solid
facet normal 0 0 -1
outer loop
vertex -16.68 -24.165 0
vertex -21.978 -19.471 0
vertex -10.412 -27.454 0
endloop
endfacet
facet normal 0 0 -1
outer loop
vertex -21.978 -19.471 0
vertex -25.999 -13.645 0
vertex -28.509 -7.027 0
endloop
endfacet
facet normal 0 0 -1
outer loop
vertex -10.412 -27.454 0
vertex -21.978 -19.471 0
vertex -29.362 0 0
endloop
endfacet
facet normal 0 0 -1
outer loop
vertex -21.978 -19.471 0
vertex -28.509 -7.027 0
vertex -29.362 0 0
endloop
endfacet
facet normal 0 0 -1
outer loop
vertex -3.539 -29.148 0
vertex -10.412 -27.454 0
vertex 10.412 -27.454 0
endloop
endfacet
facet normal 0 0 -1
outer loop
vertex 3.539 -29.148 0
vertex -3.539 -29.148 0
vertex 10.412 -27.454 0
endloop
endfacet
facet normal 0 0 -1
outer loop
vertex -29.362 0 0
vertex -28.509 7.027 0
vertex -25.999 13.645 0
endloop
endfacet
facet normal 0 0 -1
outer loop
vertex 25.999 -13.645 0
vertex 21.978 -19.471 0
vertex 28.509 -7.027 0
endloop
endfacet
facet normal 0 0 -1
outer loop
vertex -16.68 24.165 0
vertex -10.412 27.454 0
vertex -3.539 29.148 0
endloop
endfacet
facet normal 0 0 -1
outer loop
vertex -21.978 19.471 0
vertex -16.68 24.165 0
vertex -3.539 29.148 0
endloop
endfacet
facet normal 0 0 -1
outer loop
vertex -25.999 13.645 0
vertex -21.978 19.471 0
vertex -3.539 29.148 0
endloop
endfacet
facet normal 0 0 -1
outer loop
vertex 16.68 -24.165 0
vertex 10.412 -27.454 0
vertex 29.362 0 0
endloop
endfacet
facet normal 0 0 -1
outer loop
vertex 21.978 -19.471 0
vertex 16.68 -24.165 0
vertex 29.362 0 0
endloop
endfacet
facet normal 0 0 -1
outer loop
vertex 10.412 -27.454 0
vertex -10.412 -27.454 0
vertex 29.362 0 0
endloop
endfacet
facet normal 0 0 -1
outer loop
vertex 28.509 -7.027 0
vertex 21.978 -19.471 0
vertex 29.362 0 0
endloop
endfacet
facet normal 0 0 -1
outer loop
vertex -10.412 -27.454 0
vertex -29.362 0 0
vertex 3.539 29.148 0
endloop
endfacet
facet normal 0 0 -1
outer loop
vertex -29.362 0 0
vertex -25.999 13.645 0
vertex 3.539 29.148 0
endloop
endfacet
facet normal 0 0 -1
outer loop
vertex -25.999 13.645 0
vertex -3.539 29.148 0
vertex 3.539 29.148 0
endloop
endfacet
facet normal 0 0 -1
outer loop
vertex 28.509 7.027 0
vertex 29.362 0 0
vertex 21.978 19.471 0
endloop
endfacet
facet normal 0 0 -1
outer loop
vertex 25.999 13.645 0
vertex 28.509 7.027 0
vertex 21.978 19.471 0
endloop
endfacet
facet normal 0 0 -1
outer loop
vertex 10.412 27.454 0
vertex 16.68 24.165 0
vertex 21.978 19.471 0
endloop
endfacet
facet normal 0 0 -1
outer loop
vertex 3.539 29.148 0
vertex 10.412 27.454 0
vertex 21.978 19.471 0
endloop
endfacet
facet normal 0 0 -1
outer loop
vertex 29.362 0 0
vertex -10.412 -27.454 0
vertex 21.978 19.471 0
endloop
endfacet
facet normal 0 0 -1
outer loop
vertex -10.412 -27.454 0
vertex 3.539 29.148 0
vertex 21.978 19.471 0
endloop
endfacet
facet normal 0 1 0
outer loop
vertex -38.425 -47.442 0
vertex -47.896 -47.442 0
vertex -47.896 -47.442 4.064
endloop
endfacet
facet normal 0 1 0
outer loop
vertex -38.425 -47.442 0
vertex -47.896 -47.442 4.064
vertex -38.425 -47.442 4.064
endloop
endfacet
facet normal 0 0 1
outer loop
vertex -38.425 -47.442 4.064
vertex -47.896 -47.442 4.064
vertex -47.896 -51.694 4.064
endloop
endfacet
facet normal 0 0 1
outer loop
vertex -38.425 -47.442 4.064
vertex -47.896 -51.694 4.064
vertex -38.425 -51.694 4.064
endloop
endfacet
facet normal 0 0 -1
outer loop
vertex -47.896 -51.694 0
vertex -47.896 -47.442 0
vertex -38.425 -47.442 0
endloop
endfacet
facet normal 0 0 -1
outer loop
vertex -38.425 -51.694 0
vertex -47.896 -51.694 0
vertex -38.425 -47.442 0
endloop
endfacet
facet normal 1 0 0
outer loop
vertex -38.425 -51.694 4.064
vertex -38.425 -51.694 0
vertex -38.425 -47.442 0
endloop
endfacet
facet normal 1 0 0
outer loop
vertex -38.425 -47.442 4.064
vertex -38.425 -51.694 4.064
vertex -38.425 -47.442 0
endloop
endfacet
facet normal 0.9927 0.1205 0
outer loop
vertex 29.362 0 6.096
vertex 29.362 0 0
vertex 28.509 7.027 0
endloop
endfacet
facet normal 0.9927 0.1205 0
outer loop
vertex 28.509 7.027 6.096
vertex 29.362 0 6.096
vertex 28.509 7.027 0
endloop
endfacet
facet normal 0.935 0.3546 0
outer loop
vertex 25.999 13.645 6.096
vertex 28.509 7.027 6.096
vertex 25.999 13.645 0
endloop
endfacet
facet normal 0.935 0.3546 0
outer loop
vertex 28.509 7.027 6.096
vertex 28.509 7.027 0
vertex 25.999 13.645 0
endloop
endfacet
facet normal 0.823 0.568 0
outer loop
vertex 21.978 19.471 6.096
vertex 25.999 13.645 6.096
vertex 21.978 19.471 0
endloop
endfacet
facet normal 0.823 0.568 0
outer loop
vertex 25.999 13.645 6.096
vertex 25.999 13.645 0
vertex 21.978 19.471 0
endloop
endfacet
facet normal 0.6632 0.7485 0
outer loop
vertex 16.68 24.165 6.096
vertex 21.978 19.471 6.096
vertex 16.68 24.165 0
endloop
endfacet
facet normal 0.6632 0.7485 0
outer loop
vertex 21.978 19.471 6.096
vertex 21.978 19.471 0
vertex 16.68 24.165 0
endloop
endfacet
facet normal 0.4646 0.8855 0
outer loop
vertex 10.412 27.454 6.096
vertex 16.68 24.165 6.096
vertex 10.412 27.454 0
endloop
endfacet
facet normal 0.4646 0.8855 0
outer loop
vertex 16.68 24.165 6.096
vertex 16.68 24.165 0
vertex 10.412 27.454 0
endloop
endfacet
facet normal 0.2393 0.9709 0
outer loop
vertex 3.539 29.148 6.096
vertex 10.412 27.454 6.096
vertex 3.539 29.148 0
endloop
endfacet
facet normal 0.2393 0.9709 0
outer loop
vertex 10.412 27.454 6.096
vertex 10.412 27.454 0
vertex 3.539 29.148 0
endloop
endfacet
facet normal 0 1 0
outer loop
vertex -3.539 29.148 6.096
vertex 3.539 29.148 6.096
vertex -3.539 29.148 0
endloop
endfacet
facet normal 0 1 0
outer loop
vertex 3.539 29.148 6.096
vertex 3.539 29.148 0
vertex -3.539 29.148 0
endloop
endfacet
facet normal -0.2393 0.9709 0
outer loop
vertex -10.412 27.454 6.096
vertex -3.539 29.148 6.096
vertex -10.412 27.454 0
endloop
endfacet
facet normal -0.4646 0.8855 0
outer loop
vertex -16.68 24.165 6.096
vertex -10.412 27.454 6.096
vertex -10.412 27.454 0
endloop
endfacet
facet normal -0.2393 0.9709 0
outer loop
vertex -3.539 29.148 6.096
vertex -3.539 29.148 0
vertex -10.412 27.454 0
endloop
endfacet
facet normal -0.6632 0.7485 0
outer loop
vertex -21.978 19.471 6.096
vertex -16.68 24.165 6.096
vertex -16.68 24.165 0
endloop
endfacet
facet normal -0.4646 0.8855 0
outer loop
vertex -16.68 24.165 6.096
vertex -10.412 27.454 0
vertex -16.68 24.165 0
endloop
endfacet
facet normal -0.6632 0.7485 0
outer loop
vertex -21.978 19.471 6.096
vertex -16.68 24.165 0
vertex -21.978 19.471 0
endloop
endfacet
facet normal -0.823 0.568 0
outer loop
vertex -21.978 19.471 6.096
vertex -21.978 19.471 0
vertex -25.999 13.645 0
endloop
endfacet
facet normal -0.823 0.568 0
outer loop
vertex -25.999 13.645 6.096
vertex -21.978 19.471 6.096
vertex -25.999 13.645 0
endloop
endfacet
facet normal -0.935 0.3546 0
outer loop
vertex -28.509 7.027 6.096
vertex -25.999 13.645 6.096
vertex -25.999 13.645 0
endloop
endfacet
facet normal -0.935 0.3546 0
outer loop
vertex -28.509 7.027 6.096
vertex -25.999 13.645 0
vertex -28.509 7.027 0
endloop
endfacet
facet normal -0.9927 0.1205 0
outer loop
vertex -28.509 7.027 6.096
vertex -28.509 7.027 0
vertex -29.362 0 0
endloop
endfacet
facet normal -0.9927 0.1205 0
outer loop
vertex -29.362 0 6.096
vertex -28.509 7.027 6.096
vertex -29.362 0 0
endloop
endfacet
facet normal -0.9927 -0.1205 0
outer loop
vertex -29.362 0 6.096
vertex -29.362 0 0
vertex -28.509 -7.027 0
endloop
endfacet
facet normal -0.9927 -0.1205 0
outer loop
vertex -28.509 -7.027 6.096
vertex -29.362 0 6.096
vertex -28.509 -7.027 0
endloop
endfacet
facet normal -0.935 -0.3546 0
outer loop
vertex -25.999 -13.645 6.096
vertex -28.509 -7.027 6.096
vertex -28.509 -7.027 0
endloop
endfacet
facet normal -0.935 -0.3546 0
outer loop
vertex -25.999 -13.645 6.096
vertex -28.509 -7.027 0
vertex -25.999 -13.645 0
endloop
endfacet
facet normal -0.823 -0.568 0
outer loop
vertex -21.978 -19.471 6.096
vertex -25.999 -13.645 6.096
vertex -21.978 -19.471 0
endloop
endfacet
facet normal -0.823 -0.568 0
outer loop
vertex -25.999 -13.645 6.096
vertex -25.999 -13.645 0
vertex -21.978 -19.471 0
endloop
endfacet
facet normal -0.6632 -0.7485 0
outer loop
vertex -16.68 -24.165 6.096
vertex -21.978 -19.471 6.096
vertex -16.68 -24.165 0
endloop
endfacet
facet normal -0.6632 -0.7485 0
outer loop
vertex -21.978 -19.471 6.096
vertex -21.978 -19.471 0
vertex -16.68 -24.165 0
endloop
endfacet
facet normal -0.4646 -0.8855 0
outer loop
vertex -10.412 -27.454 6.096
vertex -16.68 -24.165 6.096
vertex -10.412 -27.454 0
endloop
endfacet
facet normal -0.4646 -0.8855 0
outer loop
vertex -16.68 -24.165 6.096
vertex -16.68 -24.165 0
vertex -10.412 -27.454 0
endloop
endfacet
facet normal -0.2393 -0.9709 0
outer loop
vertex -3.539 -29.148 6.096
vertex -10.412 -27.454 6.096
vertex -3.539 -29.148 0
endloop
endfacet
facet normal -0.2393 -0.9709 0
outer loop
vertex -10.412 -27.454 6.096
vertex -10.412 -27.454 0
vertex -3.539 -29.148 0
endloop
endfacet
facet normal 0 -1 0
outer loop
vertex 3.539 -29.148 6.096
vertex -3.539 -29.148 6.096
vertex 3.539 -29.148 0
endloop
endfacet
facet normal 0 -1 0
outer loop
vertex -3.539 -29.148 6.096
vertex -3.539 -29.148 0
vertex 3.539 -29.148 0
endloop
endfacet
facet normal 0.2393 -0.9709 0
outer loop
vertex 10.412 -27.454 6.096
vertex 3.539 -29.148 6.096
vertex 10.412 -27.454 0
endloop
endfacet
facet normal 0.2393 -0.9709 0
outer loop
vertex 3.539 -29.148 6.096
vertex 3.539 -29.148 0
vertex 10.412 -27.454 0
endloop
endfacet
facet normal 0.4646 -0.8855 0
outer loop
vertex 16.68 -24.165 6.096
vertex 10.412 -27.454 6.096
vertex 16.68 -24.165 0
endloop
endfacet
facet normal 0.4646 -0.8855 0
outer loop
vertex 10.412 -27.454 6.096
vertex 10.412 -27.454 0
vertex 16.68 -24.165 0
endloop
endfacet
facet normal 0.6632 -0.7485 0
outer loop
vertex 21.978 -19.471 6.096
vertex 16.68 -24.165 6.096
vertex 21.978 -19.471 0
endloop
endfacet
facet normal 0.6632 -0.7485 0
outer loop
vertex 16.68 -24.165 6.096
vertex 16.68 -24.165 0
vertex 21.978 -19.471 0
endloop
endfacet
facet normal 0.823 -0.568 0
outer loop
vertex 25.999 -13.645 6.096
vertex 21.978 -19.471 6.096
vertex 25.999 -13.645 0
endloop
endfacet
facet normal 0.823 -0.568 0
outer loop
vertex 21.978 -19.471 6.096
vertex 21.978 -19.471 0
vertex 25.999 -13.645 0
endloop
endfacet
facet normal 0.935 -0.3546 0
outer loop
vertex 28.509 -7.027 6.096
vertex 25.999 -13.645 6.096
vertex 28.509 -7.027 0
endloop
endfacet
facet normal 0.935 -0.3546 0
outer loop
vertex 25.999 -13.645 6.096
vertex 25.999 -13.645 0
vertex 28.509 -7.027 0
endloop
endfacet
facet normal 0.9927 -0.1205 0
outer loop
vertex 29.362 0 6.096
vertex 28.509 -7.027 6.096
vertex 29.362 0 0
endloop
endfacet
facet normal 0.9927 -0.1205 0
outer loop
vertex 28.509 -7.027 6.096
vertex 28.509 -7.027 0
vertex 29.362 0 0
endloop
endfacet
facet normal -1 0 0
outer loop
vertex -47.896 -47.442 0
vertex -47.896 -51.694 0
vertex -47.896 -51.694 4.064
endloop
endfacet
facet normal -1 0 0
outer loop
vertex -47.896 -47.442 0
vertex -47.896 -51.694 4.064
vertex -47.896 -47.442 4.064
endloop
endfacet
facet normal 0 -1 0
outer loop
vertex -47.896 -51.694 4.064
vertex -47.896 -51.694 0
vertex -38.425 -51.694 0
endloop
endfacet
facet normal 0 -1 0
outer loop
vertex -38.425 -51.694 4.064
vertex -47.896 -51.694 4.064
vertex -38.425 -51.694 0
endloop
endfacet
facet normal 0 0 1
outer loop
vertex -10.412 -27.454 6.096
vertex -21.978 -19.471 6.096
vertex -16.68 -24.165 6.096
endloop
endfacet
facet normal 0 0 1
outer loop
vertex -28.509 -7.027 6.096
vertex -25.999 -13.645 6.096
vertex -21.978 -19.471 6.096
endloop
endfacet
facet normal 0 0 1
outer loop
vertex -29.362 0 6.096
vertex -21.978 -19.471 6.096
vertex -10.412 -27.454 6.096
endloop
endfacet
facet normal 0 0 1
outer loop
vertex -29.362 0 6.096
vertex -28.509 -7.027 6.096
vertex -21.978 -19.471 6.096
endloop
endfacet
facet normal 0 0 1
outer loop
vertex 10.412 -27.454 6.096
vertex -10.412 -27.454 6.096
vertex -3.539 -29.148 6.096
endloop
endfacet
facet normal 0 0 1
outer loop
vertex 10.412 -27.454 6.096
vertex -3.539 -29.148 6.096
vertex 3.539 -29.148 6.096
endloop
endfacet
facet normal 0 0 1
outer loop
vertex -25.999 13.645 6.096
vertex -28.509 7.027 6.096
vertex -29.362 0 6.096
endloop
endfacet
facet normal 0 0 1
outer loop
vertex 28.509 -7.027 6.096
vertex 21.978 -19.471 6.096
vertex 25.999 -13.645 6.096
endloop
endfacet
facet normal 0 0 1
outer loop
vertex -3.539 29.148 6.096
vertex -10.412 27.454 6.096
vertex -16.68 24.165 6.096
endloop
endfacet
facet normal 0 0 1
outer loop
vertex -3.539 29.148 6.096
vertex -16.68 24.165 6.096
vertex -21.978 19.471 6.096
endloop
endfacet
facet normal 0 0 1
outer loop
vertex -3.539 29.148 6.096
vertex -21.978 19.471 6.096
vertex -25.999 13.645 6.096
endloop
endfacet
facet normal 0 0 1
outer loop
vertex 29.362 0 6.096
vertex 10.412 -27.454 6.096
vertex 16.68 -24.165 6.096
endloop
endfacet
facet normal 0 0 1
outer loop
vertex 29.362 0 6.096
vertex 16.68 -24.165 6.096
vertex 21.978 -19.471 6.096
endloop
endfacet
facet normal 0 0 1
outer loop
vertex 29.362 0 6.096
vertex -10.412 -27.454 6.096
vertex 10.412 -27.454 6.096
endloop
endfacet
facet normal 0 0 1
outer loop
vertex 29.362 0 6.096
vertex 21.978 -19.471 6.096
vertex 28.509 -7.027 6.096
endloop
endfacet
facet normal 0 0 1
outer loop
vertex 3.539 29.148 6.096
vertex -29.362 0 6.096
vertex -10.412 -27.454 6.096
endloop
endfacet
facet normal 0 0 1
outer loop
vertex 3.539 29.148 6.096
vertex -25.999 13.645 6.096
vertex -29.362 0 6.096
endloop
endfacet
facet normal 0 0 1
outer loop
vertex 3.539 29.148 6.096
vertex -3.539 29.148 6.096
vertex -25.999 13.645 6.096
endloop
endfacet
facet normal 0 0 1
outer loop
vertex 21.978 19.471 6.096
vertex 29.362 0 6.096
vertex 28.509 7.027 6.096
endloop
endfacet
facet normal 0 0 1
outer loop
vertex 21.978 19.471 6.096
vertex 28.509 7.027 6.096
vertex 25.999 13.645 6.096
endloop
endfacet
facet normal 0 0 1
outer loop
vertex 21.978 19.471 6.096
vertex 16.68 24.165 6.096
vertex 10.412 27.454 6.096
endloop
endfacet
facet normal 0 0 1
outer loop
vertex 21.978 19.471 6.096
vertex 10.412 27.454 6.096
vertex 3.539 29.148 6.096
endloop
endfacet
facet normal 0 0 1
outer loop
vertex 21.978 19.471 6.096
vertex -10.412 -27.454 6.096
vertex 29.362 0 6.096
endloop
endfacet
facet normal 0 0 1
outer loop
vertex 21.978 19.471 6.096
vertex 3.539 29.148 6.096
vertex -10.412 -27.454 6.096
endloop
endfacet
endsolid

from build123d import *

# Parameters (mm, degrees)
F0_R     = 29.3624
F1_DEPTH = 6.096
F2_W     = 9.471014
F2_H     = 4.251368
F3_DEPTH = 4.064


with BuildPart() as f1:
    # F0 (on Top) → F1 (new body)
    with BuildSketch(Plane.XY):
        Circle(F0_R)
    extrude(amount=F1_DEPTH)


with BuildPart() as f3:
    # F2 (on Top) → F3 (new body)
    with BuildSketch(Plane.XY):
        with Locations((-43.160599, -49.567897)):
            Rectangle(F2_W, F2_H)
    extrude(amount=F3_DEPTH)


solid = Compound([f1.part, f3.part])
